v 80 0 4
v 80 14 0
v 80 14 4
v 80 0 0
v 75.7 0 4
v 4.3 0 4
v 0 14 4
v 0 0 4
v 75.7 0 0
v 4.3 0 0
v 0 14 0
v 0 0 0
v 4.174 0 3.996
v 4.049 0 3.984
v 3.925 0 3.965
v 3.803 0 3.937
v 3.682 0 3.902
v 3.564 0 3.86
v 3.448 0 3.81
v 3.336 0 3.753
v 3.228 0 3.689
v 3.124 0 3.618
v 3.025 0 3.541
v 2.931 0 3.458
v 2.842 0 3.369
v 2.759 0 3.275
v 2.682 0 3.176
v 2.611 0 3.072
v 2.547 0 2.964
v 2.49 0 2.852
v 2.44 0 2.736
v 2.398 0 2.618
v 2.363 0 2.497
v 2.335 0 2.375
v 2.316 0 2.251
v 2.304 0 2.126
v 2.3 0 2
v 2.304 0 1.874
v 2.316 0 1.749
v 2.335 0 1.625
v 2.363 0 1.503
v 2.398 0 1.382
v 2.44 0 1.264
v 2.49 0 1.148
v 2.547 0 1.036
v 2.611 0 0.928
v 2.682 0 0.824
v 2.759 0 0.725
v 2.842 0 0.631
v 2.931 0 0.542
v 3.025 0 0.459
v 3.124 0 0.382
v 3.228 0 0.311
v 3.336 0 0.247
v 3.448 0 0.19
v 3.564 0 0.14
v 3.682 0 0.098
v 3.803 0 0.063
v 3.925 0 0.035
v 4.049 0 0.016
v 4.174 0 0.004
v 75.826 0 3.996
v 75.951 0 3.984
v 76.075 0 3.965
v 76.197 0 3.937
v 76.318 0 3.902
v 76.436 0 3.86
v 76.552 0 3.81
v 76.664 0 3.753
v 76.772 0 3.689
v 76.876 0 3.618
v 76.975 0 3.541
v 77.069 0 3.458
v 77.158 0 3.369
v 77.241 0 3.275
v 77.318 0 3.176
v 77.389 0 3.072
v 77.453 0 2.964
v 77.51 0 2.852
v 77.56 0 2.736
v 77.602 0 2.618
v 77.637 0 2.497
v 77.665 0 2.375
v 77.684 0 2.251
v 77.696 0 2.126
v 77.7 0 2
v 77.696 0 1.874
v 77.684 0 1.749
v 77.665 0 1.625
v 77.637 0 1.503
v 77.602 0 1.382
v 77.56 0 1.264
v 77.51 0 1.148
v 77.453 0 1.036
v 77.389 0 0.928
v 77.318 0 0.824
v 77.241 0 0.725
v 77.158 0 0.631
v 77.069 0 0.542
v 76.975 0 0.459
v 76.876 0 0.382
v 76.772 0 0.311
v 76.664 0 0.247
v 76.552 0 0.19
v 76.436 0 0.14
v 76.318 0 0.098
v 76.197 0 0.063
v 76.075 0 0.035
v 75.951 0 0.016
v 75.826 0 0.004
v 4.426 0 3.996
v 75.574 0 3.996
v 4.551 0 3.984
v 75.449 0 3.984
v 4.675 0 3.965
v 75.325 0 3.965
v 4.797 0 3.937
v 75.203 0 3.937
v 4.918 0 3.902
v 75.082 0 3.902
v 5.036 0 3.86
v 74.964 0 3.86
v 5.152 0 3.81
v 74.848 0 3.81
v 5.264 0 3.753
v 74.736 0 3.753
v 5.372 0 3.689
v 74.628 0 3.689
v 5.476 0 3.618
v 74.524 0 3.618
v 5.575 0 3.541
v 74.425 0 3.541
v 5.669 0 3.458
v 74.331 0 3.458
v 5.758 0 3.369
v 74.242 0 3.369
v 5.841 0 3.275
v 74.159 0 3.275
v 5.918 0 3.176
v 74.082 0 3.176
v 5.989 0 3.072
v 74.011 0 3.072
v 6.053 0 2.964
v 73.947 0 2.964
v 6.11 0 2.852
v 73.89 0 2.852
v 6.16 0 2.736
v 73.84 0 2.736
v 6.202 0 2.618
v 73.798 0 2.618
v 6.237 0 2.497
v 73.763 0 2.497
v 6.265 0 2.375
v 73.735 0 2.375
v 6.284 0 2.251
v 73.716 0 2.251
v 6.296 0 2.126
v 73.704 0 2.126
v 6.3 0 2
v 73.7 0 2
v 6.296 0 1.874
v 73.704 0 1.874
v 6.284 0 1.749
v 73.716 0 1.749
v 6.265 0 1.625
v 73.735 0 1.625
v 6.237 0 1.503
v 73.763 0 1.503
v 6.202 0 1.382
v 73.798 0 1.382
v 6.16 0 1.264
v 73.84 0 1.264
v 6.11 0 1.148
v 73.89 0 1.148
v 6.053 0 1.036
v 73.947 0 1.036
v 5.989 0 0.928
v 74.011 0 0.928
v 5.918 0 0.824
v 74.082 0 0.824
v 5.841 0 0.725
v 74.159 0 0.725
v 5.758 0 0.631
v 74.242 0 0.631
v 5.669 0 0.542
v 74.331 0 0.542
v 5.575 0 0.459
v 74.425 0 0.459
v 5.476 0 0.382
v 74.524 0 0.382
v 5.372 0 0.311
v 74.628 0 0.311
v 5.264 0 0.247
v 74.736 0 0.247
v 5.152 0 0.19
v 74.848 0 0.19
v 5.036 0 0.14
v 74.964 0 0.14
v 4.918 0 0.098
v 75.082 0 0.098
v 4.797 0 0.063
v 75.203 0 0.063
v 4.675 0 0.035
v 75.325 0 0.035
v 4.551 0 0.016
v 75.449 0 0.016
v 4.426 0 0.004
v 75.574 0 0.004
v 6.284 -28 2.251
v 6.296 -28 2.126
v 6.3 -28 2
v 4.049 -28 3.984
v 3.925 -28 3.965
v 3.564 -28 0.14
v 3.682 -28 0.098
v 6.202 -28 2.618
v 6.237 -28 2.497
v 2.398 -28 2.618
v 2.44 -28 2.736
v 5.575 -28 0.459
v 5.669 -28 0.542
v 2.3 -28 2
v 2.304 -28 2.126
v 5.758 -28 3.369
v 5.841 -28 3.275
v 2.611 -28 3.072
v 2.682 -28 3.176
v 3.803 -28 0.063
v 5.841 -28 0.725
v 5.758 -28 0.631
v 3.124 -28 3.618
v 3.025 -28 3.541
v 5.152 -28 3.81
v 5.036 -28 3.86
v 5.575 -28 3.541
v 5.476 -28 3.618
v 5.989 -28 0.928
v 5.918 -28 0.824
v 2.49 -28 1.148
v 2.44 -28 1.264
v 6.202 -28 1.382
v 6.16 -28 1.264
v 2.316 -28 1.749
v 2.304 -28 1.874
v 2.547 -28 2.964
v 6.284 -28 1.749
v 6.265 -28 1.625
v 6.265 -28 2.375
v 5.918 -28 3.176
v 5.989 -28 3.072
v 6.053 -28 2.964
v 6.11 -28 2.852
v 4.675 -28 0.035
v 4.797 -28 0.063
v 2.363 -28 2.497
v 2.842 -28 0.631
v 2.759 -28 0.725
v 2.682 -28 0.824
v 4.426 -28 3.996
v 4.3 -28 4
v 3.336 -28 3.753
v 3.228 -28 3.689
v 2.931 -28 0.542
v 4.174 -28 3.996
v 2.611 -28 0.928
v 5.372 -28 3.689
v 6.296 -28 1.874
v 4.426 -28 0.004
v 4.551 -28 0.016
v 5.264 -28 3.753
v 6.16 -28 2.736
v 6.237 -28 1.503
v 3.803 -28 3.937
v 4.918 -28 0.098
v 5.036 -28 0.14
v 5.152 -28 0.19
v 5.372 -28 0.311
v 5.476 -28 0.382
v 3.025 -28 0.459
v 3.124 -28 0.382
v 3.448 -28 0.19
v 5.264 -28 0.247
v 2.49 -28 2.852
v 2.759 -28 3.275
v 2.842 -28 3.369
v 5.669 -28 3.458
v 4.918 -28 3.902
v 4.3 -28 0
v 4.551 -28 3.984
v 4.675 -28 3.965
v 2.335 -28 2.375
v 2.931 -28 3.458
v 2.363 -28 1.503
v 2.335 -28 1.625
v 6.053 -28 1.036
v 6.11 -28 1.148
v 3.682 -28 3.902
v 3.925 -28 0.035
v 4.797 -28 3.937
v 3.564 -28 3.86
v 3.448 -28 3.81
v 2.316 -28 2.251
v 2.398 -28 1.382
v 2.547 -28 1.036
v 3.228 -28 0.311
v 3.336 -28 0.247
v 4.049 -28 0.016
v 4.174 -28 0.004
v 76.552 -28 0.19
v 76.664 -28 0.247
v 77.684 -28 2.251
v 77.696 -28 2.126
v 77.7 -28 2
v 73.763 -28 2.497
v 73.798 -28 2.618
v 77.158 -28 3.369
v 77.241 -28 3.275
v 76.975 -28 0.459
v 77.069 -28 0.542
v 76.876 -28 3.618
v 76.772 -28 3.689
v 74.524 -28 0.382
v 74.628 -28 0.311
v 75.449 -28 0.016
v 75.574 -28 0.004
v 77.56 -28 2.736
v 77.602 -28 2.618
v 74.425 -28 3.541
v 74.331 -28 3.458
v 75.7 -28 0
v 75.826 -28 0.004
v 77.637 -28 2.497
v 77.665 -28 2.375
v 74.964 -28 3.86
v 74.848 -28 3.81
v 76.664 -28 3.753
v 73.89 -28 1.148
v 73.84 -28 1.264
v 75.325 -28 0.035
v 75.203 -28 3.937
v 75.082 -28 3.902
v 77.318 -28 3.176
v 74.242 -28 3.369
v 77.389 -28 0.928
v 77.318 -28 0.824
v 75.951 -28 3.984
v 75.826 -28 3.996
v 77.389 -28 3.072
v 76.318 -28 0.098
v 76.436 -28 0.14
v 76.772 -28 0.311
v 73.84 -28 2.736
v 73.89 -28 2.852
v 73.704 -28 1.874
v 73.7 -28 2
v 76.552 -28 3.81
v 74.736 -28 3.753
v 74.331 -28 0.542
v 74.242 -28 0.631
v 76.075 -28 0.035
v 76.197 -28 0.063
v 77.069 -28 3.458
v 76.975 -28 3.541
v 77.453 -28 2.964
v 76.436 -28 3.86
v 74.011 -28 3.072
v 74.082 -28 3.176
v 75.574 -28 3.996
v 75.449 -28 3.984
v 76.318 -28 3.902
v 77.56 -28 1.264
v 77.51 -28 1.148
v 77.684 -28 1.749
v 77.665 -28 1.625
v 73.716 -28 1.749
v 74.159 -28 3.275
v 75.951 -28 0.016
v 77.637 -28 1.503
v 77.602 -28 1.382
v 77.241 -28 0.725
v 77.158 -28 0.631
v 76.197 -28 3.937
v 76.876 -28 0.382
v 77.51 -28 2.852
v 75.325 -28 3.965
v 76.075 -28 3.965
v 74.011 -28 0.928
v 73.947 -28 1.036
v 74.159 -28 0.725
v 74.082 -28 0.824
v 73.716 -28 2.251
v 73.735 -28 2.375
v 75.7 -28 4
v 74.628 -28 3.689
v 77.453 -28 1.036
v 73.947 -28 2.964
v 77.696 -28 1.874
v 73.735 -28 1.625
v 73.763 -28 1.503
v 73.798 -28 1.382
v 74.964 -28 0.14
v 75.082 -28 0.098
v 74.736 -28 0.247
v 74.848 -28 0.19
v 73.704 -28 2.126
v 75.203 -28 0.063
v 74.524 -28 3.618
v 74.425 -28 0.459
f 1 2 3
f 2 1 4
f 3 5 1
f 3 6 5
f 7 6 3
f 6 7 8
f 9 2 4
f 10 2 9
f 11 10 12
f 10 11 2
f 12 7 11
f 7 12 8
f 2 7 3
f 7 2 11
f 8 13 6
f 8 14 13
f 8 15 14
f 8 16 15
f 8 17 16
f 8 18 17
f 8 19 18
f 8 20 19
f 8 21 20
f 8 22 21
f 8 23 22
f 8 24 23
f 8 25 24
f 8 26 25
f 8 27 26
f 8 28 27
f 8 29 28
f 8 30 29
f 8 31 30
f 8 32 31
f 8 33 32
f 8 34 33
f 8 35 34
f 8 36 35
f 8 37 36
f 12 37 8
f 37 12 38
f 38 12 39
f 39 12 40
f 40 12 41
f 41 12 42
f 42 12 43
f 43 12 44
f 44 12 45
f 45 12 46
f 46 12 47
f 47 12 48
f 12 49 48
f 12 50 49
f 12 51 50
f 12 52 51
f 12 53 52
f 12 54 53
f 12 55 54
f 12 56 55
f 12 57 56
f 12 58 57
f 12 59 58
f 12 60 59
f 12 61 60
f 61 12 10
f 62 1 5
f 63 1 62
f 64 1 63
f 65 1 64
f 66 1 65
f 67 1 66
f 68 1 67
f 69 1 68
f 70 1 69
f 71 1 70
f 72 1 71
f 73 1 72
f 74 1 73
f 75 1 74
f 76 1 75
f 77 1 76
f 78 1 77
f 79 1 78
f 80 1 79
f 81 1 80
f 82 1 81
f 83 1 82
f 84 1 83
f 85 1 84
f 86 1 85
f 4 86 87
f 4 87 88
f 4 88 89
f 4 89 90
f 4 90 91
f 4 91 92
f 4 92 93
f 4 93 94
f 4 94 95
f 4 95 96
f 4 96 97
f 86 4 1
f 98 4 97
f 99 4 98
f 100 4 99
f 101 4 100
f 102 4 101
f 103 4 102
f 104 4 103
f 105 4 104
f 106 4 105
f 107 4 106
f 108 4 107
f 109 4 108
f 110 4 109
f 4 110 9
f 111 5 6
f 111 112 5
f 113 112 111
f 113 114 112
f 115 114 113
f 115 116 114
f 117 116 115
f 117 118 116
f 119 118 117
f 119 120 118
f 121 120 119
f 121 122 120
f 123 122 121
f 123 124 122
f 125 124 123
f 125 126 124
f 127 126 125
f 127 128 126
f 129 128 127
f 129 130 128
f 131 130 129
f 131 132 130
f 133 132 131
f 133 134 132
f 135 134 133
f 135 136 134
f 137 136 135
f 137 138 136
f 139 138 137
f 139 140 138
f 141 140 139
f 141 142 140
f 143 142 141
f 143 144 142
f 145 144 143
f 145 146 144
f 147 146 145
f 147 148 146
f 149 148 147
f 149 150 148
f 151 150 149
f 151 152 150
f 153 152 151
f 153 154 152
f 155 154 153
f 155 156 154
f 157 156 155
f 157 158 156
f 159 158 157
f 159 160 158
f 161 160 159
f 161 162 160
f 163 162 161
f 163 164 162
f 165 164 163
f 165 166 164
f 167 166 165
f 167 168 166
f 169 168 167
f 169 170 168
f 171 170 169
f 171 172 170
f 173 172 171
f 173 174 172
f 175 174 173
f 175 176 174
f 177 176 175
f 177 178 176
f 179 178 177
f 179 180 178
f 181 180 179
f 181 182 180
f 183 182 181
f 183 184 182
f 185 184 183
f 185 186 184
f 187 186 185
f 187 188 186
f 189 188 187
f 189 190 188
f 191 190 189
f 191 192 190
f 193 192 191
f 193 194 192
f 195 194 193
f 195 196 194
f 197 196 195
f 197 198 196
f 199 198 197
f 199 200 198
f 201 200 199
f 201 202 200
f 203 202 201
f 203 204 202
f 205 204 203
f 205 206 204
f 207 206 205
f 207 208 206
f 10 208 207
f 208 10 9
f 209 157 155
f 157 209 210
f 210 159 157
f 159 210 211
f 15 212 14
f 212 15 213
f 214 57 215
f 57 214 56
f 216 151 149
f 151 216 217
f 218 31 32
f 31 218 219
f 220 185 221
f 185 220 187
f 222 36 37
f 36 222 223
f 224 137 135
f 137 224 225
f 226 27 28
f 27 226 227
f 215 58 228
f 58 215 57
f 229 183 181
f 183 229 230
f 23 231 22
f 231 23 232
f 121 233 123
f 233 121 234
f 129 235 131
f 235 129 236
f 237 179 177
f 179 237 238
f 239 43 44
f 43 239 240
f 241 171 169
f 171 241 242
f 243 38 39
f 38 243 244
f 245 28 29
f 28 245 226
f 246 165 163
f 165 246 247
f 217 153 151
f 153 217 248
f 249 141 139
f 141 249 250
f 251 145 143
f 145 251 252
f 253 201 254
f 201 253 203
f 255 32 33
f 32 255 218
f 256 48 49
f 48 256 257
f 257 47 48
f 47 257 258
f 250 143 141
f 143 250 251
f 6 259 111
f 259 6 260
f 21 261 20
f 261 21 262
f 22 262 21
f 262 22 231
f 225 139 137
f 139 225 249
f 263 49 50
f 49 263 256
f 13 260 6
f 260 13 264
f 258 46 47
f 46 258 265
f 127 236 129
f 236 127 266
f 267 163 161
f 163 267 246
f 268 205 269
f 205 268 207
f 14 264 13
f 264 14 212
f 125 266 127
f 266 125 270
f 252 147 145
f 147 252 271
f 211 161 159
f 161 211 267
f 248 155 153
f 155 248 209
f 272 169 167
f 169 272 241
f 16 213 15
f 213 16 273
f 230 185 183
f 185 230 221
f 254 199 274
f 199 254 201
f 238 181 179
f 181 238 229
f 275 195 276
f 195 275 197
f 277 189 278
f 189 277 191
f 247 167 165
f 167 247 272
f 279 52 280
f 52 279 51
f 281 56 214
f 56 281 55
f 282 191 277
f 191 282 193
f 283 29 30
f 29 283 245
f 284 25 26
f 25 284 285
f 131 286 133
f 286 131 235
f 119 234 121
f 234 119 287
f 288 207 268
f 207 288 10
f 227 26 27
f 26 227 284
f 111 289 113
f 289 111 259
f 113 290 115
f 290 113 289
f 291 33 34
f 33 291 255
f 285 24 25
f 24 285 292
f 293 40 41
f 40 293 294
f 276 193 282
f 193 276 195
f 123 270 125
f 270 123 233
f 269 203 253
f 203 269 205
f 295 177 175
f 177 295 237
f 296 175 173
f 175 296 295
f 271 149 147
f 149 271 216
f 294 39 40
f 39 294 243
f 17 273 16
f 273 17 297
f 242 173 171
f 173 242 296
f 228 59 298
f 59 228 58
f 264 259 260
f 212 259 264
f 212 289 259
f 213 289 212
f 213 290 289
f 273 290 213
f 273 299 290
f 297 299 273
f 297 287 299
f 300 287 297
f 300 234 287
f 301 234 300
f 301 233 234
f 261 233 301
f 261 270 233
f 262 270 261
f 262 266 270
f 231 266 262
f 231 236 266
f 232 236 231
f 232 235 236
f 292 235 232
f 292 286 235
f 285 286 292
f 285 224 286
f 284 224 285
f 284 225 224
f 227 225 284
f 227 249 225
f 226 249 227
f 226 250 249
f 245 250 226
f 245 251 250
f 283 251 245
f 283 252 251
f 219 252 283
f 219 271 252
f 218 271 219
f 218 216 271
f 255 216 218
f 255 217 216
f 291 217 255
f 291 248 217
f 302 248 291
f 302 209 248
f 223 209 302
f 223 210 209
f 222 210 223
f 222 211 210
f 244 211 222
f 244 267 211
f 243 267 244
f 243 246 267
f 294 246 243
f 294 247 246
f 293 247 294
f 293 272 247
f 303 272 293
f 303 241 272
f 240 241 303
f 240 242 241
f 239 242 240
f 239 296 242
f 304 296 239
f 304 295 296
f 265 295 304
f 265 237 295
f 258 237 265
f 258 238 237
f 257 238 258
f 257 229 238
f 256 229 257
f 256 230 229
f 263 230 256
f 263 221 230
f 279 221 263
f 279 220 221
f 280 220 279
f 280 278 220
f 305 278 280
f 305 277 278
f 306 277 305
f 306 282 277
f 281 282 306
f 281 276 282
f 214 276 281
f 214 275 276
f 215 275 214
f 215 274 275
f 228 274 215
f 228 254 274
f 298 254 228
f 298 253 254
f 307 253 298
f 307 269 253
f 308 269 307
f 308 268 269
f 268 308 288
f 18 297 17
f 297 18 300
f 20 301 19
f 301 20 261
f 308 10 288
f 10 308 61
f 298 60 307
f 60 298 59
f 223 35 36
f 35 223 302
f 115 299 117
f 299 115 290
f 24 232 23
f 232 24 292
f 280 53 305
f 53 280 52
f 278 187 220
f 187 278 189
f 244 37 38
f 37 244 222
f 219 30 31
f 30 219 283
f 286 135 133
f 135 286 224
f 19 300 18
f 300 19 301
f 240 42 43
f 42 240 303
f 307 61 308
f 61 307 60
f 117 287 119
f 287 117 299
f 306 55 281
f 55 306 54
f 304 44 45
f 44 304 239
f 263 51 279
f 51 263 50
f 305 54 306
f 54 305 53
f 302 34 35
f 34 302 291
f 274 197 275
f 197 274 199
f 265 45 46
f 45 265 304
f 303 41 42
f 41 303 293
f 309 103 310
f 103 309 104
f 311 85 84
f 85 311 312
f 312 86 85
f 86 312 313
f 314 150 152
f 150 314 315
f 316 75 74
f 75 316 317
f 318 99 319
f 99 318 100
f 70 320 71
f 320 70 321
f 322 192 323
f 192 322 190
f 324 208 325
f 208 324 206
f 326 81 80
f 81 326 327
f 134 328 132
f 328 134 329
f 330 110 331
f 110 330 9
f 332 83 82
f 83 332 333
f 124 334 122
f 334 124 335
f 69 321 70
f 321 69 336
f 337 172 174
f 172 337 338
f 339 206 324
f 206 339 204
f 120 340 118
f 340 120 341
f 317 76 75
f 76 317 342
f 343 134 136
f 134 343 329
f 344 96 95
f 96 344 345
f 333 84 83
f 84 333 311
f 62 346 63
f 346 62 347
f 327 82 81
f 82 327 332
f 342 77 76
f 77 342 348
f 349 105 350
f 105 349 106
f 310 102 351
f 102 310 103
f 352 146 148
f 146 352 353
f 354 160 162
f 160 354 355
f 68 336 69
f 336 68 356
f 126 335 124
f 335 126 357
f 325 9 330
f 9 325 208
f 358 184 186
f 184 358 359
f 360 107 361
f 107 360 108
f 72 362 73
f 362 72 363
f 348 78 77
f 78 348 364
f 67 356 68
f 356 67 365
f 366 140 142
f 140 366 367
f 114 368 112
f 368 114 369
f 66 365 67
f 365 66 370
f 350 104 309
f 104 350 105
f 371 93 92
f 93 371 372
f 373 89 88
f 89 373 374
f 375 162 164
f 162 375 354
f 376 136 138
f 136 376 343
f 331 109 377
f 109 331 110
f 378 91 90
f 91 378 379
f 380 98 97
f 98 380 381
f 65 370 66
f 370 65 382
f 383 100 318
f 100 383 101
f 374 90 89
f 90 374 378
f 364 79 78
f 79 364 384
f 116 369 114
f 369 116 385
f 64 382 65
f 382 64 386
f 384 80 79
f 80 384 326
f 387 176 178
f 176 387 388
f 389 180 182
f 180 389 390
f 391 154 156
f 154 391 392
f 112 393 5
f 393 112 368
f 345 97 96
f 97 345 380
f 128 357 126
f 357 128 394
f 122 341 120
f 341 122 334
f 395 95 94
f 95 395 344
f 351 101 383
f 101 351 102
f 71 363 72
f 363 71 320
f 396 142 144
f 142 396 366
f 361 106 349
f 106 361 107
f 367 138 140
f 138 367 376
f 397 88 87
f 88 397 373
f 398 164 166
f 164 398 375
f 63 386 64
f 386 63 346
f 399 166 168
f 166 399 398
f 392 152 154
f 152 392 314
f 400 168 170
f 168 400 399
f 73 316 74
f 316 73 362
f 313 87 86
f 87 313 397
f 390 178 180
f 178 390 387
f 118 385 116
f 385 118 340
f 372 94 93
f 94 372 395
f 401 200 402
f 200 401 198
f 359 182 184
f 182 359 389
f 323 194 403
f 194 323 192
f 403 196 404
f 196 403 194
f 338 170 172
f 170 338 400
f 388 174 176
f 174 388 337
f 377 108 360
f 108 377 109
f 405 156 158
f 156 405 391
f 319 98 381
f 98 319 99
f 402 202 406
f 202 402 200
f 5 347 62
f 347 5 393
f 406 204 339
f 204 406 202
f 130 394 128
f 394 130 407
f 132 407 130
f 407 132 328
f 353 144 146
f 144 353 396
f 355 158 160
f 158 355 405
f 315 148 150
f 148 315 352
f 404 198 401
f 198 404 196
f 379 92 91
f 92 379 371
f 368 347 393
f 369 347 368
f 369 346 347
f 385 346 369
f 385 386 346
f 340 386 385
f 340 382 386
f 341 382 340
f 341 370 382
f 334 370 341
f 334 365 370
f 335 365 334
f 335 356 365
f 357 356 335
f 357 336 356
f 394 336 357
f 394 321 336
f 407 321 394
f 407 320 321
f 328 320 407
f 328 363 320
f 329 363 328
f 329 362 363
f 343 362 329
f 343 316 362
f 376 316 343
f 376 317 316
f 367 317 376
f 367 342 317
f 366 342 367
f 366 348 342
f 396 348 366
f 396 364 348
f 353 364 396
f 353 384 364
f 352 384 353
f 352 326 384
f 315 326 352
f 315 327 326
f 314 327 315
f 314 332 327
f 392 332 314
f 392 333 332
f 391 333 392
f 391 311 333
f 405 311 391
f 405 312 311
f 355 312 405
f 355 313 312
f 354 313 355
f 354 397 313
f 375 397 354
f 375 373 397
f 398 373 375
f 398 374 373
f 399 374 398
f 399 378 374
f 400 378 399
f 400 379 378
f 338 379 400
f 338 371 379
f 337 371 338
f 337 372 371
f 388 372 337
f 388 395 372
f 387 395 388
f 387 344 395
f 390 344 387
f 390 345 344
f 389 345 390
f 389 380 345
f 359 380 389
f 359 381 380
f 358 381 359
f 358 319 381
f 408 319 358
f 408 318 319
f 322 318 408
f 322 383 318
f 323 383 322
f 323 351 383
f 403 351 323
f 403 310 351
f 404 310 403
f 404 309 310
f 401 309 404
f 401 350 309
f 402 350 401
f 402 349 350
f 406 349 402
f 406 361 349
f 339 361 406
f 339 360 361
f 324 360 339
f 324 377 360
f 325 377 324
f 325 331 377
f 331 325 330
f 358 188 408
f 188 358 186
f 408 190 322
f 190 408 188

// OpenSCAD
$fn = 100;

union() {
	cube(size = [80, 14, 4]);
	translate([4.3, 2, 2]) {
		rotate([90, 0, 0]) {
			cylinder(r = 2, h = 30);
		}
	}
	
	translate([75.7, 2, 2]) {
		rotate([90, 0, 0]) {
			cylinder(r = 2, h = 30);
		}
	}
}
